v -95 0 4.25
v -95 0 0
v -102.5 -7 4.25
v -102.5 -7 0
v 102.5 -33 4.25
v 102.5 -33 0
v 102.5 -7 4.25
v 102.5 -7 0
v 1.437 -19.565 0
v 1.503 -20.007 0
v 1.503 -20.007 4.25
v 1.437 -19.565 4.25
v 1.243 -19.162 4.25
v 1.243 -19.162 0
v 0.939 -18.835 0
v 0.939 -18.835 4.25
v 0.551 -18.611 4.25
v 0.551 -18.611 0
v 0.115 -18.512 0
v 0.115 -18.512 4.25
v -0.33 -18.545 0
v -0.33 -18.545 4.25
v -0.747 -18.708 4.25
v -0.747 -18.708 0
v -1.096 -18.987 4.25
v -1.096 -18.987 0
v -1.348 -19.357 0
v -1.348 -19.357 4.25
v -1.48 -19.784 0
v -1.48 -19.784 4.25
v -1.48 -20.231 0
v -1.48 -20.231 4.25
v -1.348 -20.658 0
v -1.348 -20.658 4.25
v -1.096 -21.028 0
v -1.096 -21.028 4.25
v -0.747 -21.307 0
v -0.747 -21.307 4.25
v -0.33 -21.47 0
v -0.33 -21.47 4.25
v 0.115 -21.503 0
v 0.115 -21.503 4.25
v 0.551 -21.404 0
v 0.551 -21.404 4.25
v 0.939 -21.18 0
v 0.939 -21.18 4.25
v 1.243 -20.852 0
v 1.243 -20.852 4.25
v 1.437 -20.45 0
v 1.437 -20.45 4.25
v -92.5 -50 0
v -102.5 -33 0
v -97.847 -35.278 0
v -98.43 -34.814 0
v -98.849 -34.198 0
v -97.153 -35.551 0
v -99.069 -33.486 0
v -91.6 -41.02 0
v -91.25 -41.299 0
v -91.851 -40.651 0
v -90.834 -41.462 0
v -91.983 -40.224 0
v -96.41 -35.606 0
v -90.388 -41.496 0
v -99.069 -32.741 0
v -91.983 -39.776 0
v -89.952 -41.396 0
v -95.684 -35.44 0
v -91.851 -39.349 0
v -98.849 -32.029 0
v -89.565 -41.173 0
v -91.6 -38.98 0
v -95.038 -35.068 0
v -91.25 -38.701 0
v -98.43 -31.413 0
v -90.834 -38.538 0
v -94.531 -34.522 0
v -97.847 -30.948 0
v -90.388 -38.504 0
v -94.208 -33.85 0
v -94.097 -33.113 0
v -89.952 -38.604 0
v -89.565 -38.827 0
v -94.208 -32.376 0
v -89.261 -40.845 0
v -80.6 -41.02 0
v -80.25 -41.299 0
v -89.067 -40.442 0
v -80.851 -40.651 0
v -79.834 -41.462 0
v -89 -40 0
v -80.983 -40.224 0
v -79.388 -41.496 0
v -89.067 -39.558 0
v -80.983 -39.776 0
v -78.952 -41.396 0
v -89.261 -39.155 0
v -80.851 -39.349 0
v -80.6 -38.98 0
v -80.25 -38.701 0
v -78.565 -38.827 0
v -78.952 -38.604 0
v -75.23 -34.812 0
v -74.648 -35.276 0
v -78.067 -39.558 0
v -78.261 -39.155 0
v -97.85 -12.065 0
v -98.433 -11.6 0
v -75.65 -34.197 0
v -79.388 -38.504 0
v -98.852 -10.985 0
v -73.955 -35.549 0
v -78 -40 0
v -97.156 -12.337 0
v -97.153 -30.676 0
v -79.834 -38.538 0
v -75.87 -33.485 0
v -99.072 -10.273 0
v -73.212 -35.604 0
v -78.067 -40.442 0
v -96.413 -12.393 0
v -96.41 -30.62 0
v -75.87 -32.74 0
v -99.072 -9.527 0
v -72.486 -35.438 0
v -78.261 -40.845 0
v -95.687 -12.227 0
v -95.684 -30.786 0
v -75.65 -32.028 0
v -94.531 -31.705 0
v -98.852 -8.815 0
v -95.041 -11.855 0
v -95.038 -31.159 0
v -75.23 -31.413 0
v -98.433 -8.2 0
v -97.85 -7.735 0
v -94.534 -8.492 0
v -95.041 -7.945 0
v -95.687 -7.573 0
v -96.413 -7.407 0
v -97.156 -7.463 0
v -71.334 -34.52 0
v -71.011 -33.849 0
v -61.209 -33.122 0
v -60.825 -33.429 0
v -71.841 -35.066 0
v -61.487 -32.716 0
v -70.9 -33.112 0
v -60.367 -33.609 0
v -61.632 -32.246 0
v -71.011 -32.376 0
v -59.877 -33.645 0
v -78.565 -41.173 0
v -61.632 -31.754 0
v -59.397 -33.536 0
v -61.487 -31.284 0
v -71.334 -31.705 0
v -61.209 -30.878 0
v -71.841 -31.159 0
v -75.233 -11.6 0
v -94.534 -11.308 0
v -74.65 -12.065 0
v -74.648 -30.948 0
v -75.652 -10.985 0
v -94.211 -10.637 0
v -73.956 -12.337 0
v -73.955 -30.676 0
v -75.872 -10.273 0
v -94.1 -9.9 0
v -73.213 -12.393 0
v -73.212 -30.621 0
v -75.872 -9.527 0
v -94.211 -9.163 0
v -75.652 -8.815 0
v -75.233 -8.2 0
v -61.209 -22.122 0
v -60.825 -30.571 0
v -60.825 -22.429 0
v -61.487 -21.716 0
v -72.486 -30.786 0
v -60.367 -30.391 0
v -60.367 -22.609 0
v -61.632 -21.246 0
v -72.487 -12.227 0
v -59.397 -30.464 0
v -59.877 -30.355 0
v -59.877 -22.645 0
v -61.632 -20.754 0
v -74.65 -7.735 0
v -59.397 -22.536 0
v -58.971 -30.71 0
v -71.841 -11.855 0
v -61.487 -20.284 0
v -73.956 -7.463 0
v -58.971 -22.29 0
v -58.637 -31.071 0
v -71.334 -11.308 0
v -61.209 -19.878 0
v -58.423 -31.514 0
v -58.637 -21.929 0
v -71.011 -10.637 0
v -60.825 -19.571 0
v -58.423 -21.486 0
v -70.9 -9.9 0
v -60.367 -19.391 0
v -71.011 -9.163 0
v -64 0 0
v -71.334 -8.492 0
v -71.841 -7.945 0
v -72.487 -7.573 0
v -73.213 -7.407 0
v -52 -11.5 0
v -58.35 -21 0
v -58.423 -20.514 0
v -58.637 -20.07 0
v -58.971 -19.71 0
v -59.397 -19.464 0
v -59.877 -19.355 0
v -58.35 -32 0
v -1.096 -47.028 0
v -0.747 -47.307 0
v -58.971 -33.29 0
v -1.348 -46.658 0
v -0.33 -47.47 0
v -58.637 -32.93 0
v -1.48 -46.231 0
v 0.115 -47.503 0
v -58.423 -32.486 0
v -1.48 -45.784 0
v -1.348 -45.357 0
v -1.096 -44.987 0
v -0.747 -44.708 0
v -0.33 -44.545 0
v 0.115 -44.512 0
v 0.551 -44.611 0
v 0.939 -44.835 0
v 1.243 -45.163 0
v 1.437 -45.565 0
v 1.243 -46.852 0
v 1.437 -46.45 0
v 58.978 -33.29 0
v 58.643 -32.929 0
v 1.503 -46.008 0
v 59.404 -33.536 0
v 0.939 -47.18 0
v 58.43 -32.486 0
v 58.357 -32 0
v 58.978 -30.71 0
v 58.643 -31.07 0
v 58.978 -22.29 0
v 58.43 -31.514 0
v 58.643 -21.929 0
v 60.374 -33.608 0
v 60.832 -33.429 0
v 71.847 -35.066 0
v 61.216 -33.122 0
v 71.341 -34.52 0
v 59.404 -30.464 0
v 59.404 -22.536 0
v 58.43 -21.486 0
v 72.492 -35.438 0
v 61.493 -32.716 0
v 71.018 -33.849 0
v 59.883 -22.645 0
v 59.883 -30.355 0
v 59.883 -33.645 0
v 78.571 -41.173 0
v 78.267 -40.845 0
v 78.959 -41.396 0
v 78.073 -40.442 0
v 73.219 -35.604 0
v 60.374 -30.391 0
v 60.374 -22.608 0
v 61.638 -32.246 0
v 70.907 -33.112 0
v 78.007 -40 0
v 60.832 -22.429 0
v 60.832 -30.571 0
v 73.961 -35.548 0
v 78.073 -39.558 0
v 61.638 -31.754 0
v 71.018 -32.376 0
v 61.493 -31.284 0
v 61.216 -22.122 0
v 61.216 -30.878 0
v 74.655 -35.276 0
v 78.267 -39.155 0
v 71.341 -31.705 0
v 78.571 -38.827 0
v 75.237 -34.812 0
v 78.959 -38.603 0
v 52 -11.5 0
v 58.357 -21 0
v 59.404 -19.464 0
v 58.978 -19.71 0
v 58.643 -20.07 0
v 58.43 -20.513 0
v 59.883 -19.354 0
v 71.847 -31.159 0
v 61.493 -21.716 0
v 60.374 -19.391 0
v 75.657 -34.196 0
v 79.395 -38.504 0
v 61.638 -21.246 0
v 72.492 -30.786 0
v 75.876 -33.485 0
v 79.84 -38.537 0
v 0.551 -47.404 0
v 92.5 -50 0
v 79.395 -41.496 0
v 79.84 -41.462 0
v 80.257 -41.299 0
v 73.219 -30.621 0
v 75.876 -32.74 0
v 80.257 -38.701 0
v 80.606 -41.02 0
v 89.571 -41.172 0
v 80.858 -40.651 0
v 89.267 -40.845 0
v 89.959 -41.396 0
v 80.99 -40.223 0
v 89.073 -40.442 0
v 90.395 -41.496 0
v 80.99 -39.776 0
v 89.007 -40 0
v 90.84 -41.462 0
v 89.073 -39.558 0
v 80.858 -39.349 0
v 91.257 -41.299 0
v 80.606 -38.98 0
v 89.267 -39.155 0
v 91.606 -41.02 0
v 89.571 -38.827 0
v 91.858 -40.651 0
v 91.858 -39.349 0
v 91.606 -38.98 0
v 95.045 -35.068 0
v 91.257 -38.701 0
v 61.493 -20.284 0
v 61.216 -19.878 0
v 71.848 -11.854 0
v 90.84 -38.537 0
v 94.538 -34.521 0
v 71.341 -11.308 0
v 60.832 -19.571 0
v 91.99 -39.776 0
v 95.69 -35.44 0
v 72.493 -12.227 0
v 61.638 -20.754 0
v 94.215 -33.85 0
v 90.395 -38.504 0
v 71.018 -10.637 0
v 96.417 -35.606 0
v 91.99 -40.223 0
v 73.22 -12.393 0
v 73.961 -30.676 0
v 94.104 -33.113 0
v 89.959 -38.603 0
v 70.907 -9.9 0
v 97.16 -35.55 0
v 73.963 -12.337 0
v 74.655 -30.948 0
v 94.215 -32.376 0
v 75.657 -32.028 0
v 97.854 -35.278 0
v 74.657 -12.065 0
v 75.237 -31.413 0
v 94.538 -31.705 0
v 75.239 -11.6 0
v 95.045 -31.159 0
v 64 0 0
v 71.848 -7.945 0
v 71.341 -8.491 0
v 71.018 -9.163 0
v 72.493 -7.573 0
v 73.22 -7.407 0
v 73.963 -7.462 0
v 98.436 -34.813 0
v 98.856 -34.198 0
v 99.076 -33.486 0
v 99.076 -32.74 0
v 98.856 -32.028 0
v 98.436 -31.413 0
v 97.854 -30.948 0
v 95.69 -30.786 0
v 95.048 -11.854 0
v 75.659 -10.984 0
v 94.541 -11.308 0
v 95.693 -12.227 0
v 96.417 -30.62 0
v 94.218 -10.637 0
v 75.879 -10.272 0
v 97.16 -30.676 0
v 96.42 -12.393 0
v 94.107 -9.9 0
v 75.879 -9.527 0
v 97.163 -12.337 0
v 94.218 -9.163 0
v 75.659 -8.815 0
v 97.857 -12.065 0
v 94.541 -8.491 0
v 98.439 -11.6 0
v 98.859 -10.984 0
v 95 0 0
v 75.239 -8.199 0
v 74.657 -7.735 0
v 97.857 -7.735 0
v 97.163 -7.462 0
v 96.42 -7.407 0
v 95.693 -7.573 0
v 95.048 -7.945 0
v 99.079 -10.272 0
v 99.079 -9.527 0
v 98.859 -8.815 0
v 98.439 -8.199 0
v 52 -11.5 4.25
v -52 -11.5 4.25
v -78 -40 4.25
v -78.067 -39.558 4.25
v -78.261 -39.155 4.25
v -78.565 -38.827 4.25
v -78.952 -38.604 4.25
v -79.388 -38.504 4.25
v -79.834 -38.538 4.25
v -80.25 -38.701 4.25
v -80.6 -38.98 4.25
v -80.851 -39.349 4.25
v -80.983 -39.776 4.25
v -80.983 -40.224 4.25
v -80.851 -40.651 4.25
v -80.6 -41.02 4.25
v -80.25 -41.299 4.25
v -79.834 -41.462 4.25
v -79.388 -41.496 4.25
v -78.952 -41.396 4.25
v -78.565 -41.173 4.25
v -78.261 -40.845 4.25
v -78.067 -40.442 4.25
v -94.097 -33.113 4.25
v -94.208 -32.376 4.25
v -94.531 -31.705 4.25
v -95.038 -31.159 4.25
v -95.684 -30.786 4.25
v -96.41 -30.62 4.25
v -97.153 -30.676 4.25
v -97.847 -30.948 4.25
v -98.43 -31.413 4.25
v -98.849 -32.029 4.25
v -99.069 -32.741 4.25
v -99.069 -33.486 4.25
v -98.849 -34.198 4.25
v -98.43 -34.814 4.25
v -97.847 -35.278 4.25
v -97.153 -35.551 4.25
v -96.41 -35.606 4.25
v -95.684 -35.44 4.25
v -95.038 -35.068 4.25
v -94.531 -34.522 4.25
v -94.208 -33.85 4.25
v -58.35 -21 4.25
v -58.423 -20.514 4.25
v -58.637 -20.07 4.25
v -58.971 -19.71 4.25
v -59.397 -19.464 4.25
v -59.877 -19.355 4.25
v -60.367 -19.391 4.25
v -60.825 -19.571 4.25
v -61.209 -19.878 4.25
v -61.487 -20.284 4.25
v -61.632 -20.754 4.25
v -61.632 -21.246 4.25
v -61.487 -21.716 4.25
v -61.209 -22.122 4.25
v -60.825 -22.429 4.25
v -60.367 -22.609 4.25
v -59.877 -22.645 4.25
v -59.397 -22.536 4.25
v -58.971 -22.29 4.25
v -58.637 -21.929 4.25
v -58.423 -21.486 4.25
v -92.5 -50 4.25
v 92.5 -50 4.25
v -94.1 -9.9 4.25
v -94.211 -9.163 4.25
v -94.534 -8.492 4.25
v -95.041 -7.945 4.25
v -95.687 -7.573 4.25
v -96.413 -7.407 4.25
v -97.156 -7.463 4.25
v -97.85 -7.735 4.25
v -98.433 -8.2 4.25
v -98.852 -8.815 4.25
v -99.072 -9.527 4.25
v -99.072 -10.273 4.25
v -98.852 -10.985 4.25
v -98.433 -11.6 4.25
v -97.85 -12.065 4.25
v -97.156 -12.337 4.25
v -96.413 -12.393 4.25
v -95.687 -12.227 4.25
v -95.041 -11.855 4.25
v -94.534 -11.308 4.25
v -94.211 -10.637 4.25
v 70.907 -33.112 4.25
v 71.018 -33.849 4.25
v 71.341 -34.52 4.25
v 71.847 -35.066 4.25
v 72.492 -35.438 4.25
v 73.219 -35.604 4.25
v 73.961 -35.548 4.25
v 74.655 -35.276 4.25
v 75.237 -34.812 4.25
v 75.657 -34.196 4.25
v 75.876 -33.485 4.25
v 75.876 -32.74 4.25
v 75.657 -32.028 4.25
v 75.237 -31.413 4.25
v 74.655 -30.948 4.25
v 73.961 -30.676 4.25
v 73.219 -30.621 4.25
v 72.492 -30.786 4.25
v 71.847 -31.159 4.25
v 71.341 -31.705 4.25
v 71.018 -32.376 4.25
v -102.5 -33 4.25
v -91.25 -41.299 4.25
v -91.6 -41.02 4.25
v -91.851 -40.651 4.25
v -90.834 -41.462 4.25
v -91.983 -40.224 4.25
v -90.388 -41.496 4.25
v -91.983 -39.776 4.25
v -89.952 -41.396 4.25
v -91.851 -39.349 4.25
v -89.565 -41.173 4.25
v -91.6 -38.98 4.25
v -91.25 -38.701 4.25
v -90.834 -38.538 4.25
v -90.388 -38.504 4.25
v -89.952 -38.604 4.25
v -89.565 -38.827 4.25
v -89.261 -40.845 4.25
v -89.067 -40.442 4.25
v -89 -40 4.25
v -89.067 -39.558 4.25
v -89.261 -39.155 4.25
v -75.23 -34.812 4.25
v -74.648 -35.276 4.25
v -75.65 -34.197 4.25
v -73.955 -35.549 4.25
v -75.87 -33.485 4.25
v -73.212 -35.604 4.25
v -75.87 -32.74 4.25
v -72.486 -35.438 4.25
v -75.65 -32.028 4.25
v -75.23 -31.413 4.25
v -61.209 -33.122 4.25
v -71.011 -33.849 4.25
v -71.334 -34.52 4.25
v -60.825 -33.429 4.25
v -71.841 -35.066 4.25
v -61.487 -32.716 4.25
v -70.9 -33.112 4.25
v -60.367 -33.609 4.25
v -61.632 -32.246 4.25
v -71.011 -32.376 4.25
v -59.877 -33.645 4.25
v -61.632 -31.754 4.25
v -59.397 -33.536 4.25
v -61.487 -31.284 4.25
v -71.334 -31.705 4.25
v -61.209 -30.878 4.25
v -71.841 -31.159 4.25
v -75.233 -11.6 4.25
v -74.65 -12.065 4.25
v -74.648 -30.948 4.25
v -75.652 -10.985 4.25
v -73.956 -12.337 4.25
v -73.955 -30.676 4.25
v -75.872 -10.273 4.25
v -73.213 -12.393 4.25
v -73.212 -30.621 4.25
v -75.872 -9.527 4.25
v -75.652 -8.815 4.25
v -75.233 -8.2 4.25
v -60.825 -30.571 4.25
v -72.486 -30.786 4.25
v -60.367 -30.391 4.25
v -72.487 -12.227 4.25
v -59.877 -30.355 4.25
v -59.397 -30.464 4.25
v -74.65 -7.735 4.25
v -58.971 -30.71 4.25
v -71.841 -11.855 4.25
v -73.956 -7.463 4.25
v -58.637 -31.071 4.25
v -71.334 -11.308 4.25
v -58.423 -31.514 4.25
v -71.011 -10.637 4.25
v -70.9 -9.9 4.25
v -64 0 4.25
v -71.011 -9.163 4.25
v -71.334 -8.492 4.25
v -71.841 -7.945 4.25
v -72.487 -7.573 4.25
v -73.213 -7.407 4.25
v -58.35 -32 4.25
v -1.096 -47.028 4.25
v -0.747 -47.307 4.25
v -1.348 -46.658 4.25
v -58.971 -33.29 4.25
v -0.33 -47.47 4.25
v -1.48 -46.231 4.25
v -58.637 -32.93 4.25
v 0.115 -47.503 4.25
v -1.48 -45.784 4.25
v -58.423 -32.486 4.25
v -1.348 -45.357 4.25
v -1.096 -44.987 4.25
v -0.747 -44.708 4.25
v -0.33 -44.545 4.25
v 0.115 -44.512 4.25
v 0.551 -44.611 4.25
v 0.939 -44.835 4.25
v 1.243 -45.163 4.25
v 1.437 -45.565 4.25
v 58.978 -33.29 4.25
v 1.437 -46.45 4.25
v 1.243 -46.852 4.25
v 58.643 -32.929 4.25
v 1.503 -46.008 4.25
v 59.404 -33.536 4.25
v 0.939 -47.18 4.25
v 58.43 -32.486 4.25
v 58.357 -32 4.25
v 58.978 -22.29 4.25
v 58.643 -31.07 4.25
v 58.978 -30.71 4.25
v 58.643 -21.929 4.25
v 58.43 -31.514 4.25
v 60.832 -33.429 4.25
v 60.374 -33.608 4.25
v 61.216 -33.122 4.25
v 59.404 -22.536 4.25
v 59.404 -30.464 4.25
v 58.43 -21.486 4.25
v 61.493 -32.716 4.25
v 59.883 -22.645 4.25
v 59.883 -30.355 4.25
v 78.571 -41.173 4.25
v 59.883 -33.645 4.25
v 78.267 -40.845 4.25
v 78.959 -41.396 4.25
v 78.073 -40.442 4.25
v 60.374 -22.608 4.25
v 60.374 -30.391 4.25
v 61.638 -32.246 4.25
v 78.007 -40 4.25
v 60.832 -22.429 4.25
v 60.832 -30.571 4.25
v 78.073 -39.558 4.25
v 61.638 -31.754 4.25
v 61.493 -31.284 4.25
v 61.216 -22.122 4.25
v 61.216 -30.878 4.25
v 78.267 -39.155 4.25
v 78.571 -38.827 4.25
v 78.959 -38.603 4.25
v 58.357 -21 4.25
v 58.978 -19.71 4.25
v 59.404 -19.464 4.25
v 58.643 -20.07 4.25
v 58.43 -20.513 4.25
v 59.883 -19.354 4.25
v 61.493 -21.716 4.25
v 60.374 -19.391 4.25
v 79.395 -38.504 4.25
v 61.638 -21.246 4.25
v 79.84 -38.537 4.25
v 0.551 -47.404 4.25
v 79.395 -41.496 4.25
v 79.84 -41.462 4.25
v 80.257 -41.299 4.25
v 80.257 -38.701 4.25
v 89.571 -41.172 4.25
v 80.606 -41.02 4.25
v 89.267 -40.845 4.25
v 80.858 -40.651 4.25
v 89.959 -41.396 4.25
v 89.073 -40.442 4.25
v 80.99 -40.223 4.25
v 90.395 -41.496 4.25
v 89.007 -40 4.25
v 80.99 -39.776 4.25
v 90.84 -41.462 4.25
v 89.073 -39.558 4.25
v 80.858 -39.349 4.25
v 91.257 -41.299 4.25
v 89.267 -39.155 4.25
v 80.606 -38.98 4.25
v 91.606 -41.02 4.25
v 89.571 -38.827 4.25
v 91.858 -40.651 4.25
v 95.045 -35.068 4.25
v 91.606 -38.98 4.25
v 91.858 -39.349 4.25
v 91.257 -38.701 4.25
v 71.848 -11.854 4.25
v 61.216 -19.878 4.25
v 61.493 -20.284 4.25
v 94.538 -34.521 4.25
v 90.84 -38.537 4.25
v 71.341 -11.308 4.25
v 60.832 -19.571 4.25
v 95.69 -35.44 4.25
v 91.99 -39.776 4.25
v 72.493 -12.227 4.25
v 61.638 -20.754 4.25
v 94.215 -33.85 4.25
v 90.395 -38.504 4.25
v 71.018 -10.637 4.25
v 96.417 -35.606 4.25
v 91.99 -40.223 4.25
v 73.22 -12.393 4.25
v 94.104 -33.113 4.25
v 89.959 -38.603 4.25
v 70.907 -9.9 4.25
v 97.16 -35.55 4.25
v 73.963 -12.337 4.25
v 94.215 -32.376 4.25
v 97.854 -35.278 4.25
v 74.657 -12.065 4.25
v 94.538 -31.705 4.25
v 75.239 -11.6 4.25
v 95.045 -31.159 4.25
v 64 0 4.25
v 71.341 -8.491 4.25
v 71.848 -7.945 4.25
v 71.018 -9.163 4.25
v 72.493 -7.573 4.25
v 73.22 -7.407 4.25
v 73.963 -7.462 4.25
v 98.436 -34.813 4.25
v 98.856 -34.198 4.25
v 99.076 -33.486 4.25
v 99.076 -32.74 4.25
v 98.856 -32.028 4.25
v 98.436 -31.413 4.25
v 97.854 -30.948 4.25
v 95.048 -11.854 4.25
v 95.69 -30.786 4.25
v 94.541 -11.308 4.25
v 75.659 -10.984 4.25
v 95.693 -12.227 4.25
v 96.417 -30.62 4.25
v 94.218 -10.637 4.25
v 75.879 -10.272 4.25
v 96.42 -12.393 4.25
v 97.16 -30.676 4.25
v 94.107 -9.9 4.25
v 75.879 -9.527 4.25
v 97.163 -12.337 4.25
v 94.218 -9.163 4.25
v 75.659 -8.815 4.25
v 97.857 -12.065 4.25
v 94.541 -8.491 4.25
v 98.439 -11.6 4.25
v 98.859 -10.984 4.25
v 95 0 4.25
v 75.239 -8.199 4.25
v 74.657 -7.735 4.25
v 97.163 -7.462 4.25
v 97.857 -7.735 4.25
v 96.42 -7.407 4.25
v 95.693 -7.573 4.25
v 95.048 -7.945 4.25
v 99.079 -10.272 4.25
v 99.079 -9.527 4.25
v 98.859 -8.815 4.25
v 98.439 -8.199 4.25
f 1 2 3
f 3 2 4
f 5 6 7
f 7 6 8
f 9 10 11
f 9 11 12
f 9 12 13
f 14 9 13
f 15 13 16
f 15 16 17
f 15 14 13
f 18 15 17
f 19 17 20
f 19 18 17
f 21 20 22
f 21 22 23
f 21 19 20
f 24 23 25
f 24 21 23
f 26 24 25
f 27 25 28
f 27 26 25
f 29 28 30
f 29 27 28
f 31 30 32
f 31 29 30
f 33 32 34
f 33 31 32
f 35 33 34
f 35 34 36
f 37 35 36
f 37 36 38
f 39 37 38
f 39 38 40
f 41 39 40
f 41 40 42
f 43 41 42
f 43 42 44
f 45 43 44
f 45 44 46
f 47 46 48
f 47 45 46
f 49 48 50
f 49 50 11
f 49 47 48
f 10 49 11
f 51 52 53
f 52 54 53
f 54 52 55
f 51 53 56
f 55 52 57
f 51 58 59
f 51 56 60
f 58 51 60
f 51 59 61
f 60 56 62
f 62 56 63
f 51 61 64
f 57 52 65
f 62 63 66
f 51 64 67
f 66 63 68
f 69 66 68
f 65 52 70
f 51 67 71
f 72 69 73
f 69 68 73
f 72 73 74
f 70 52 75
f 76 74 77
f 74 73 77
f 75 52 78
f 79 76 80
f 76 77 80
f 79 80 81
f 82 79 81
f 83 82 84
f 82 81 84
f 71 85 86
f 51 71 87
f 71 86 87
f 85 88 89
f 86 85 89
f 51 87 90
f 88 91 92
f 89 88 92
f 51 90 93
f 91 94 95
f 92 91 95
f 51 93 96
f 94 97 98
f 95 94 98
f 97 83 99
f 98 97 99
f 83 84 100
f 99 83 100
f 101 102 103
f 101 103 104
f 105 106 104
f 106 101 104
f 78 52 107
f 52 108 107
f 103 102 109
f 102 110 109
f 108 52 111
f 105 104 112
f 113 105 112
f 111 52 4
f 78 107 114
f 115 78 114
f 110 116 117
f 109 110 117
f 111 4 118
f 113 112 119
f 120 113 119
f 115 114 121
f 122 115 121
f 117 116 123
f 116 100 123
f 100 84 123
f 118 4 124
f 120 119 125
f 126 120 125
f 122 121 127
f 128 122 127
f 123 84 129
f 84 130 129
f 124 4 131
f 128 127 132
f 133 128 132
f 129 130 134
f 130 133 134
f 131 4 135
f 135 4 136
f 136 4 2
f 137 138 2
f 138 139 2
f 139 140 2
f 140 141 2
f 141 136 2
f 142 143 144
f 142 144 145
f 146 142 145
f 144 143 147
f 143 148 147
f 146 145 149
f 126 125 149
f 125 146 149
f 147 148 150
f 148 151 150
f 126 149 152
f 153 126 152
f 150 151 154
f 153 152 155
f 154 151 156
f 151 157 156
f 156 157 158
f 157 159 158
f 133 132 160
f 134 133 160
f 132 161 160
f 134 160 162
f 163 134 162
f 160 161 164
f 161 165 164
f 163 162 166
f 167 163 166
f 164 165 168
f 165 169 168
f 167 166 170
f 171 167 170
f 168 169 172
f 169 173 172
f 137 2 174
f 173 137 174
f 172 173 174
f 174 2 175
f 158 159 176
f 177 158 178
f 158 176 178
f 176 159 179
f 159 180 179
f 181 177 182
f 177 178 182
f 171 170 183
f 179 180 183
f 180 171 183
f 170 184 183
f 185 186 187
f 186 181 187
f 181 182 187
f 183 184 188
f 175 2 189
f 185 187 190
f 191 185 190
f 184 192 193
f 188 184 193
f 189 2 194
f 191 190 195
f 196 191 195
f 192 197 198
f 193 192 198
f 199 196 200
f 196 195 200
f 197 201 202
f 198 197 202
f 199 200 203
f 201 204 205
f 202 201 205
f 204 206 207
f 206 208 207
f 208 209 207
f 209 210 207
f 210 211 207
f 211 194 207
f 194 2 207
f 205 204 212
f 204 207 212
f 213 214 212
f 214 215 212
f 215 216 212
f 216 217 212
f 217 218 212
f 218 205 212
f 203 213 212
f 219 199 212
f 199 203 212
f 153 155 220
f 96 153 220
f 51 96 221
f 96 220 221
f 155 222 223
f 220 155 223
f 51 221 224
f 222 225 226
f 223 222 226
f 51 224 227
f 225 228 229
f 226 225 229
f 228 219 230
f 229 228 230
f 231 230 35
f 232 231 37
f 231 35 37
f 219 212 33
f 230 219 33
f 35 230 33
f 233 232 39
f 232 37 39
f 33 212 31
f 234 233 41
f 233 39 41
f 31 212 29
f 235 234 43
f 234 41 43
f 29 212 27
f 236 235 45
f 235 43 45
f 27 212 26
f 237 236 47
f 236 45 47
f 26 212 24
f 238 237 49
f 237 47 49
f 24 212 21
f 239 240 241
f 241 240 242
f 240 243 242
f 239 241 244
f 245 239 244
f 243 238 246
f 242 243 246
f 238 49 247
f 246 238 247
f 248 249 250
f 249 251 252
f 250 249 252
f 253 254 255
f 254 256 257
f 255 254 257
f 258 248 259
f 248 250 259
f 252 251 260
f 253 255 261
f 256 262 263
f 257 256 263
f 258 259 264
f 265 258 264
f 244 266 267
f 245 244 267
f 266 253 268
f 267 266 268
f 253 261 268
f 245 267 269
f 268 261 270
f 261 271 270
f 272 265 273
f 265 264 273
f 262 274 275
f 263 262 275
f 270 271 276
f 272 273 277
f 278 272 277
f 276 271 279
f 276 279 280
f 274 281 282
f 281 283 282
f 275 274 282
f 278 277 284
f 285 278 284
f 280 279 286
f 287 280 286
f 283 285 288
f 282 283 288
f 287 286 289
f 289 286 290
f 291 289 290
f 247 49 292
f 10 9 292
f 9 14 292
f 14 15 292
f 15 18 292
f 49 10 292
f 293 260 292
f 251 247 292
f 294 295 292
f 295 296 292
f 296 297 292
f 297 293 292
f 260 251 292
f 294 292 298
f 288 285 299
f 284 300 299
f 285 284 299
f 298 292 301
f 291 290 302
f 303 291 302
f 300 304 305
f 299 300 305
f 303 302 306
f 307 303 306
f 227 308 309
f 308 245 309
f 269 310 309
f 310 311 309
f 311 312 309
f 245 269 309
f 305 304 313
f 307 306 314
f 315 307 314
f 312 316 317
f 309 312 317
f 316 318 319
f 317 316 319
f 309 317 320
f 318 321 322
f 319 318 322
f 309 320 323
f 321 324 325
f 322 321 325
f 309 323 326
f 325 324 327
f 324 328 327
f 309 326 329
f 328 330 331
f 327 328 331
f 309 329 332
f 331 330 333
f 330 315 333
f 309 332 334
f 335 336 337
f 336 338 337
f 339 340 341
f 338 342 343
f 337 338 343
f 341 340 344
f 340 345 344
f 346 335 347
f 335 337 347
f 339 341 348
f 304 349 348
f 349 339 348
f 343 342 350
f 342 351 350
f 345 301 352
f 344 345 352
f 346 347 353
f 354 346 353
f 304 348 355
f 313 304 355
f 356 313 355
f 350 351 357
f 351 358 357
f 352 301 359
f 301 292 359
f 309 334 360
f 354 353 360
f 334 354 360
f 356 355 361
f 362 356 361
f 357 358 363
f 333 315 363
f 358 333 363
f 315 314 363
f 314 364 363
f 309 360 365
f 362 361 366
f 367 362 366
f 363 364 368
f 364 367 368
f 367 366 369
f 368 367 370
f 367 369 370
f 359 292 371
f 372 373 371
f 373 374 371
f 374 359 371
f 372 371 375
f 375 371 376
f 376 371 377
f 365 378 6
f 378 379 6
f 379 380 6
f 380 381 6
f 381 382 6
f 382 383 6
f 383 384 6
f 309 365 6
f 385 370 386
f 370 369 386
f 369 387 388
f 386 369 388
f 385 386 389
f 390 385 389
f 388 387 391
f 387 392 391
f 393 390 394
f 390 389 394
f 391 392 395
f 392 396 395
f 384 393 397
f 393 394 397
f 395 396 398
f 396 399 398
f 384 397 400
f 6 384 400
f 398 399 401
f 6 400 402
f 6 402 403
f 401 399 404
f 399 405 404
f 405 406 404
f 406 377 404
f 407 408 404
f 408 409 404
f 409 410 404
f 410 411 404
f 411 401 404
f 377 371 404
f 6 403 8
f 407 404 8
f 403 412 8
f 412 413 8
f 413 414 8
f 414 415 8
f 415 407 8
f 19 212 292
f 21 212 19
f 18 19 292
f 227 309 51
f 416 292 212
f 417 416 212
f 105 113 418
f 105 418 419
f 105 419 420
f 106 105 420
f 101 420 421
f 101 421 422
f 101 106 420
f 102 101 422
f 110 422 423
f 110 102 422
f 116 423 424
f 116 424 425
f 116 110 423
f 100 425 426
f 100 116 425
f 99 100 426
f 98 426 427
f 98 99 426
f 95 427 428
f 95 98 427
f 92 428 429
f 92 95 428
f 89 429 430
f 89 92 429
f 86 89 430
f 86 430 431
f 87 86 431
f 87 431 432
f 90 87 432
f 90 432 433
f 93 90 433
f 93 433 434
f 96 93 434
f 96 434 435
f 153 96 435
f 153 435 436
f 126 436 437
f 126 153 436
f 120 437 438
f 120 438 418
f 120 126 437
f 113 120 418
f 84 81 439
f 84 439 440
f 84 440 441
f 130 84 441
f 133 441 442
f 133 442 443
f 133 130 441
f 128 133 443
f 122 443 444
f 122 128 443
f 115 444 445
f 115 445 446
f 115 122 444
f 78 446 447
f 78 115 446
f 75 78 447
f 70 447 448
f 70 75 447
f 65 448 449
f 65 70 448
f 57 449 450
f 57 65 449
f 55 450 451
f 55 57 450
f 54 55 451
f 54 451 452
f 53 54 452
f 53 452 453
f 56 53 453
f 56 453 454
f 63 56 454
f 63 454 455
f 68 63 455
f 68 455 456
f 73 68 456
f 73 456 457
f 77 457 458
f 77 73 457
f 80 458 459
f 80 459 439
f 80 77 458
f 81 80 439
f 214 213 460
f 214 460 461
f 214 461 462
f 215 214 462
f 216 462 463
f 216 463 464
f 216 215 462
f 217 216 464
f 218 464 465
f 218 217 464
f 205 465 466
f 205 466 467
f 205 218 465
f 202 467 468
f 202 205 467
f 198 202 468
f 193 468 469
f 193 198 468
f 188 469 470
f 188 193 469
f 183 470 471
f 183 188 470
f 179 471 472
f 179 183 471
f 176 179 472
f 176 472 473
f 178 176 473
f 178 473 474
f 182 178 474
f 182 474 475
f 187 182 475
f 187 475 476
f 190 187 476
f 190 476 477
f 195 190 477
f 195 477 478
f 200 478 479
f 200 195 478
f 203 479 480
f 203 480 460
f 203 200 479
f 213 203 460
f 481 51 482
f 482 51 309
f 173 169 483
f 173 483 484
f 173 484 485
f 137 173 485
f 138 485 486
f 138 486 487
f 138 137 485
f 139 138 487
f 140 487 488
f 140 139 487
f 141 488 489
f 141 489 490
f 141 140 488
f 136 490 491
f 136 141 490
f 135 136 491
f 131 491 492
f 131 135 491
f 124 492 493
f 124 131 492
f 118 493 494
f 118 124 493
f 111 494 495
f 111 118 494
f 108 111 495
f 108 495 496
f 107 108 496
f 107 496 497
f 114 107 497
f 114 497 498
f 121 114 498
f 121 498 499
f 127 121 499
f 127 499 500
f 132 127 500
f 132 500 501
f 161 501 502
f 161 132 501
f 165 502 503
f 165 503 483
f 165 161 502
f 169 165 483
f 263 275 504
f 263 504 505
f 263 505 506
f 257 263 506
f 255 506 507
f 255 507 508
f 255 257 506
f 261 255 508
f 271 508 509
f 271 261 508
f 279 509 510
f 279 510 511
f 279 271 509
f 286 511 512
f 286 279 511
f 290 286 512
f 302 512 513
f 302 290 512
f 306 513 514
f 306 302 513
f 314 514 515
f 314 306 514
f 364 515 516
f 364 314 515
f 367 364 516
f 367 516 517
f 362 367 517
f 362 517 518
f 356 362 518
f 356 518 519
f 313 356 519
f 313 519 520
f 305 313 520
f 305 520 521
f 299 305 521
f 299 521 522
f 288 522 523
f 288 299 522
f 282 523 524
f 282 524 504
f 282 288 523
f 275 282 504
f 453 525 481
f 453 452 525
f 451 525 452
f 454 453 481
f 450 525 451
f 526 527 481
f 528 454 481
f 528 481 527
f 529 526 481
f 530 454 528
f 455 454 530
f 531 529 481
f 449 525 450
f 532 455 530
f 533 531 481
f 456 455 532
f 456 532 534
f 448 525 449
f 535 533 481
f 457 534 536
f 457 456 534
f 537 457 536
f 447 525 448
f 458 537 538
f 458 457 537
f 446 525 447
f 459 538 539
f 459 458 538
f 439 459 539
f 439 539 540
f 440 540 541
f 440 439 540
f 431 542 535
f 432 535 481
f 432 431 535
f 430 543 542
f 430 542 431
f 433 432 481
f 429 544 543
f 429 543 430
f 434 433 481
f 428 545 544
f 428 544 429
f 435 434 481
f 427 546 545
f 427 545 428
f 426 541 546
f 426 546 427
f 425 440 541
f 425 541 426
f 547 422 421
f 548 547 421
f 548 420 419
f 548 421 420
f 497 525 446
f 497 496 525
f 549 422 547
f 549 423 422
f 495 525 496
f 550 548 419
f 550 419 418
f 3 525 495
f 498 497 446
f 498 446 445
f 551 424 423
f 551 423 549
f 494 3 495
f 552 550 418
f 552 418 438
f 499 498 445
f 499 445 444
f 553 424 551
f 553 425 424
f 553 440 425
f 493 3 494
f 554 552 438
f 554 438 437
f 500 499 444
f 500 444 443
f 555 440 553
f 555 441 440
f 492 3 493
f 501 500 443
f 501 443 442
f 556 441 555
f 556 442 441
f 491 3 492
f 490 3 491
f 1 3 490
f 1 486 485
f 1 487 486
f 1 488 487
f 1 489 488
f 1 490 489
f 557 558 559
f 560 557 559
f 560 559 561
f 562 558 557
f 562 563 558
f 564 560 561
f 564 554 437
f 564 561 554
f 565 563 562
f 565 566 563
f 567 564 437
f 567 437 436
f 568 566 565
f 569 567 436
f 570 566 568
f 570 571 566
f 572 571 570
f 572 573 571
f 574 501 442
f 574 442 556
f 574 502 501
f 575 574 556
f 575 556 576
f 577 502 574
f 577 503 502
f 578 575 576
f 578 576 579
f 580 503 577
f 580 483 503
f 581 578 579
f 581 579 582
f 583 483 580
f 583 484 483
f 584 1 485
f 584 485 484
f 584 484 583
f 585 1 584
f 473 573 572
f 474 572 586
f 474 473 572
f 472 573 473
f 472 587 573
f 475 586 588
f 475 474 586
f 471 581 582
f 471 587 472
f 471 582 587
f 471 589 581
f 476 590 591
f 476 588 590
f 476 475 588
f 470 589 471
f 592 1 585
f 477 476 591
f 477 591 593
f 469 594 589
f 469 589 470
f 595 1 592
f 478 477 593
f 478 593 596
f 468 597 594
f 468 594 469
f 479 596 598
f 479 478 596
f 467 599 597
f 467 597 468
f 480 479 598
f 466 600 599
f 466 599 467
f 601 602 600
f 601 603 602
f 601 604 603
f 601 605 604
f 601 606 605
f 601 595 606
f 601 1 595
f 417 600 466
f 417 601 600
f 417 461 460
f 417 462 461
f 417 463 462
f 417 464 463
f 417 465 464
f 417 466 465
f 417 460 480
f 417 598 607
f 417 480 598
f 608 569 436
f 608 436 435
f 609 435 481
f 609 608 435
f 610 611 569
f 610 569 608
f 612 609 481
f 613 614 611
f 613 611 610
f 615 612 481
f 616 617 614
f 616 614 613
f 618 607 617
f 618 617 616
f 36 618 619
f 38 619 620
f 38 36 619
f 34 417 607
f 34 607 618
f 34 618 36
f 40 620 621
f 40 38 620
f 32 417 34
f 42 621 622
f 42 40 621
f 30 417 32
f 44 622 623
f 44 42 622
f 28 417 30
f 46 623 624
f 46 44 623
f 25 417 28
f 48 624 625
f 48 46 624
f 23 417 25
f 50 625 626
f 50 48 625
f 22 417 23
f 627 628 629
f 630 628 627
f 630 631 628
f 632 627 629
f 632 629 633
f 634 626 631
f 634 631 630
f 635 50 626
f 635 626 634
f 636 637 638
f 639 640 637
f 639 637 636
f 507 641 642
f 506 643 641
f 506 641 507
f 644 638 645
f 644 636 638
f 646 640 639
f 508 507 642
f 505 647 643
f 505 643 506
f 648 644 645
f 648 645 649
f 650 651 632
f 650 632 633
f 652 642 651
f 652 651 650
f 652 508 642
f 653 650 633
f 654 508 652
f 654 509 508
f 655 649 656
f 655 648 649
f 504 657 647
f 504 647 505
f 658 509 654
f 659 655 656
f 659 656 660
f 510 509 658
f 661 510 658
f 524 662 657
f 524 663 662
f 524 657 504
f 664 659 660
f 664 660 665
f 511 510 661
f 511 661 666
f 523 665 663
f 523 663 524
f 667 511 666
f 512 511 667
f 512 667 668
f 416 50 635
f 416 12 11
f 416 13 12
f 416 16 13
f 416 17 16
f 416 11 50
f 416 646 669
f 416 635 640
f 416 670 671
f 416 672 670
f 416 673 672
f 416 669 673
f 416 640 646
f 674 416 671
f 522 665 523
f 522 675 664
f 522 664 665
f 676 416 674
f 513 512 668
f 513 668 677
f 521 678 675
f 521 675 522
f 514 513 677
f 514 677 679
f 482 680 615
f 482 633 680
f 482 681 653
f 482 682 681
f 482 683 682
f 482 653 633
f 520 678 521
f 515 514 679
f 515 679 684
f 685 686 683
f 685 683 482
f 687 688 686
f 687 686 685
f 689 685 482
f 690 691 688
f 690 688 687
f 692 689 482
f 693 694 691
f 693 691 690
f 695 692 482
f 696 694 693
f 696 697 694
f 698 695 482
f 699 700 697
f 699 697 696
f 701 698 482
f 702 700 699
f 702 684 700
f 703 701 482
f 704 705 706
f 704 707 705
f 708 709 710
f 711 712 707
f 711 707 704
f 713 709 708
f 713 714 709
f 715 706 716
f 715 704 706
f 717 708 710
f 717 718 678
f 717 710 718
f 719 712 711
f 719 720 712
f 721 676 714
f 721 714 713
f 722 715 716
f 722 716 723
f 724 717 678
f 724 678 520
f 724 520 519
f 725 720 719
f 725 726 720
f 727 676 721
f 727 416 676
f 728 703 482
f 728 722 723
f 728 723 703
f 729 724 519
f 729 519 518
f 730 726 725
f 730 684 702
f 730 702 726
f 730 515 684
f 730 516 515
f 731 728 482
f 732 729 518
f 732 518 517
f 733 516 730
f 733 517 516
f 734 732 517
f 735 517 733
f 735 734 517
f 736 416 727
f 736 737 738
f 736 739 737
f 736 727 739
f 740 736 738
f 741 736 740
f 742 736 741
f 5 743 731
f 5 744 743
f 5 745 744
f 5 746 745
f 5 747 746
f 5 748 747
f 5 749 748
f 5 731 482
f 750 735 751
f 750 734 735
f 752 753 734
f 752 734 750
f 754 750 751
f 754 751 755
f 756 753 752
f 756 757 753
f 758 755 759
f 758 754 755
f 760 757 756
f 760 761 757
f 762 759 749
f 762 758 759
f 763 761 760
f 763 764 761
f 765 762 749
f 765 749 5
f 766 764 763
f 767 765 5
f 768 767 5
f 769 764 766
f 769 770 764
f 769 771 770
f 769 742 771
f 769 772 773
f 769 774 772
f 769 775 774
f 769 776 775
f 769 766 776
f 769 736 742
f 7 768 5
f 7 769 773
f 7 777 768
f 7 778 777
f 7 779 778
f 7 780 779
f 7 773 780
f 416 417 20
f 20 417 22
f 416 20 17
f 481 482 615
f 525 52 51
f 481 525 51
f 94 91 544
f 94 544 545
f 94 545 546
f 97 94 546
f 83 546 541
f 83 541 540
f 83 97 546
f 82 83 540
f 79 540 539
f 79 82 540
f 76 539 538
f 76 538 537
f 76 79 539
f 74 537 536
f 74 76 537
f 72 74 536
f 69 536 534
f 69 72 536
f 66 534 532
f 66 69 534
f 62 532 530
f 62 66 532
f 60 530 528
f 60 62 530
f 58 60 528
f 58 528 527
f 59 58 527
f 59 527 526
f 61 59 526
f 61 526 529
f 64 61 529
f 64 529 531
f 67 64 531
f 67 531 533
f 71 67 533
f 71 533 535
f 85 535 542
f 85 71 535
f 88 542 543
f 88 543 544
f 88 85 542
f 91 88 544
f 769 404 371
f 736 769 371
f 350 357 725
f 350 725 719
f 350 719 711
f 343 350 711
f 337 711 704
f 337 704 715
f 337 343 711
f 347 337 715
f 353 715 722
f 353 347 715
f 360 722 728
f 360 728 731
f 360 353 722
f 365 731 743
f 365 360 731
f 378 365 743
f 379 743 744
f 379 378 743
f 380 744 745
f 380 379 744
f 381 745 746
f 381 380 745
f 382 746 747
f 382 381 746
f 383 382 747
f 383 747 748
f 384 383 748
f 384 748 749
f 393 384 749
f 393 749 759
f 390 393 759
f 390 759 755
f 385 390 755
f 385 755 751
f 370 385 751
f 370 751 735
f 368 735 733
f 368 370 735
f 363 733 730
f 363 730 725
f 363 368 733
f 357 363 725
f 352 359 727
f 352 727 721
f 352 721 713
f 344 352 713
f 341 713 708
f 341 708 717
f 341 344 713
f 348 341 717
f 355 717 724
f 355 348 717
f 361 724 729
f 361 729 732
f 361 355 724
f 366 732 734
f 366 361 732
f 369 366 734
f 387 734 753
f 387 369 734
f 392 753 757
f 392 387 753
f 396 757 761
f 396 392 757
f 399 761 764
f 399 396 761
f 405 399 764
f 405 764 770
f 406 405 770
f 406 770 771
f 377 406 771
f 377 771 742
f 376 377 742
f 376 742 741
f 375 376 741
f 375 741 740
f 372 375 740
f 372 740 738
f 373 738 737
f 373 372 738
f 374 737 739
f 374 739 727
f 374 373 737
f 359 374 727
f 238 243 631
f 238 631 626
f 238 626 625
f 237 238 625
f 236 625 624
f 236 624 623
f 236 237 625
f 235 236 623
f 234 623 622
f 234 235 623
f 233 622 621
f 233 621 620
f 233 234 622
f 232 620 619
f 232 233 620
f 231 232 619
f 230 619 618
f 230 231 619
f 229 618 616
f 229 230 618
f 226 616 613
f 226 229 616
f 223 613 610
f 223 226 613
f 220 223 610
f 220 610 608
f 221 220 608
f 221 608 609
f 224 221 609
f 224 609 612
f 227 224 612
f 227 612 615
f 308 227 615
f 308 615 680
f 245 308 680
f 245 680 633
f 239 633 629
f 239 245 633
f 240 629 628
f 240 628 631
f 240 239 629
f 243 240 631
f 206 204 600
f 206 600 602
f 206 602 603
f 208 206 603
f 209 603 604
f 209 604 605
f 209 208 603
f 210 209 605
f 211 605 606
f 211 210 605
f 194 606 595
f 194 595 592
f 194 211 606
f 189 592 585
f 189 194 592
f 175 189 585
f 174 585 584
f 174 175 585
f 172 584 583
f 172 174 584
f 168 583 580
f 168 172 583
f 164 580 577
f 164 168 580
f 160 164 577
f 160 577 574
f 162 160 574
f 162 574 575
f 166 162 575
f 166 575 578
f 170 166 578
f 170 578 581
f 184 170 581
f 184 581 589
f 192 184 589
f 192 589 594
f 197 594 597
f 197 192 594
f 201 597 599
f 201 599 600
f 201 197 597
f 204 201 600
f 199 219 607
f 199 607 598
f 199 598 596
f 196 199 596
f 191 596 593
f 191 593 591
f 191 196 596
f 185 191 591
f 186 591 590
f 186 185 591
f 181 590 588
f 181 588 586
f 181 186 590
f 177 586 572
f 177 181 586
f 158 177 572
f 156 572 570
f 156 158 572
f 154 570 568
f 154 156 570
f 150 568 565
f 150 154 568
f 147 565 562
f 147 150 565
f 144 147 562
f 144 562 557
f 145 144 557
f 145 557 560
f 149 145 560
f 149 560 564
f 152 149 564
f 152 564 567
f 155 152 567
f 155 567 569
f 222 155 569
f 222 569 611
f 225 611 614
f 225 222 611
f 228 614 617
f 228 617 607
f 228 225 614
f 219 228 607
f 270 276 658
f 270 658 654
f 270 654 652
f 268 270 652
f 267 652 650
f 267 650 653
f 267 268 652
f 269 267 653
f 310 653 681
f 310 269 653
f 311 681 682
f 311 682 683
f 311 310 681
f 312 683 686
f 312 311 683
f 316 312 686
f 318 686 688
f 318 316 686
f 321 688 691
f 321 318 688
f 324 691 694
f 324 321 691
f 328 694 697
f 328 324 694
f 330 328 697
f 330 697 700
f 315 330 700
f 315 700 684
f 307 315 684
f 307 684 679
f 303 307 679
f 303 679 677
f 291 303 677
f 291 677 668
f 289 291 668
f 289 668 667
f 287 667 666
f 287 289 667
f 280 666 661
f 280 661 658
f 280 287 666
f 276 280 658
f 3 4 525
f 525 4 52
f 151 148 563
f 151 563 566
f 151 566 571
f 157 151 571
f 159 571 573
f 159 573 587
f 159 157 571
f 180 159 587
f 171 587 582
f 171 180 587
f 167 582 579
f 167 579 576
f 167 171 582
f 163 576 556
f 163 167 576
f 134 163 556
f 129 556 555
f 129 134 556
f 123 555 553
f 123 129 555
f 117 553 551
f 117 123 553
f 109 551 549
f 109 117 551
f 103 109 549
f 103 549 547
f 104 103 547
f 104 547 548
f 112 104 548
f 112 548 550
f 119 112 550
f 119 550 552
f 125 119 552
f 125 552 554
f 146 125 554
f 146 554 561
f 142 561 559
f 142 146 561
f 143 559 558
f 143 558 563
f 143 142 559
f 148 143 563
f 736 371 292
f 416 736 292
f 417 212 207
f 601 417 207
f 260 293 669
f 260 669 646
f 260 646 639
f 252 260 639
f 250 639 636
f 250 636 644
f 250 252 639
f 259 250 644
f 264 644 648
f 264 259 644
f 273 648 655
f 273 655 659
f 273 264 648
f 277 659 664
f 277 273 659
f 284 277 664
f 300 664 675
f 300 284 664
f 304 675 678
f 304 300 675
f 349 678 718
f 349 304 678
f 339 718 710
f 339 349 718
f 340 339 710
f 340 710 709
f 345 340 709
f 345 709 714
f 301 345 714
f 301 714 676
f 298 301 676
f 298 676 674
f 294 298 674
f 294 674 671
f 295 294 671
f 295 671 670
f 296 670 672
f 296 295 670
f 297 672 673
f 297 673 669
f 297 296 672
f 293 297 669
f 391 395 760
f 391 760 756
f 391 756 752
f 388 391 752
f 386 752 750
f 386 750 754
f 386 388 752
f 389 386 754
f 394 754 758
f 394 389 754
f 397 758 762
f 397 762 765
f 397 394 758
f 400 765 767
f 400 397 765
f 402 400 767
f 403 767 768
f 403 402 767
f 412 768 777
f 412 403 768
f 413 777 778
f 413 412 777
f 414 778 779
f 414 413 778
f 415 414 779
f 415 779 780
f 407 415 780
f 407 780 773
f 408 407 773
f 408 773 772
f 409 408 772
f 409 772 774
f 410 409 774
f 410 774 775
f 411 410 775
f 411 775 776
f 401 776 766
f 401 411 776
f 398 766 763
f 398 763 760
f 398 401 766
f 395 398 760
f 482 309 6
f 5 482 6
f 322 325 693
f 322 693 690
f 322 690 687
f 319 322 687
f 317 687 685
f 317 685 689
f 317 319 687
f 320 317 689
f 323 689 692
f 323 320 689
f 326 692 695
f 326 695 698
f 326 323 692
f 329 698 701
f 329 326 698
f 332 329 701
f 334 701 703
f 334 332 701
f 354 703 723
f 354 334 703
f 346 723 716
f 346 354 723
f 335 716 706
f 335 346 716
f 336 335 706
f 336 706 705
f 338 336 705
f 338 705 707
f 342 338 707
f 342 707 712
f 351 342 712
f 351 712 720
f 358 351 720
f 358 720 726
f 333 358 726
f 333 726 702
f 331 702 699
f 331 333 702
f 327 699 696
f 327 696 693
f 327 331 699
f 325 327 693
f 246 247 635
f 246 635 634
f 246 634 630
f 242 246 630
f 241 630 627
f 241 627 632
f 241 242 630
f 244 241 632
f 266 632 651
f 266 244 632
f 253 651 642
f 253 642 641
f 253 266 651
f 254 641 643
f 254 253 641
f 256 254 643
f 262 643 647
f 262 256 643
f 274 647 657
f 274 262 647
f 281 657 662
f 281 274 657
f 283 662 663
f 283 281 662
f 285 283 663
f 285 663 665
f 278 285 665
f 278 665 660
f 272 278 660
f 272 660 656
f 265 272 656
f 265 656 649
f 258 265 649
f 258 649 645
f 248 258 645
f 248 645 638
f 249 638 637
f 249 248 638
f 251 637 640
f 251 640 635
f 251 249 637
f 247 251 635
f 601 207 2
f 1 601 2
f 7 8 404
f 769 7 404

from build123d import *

# Parameters (mm, degrees)
SKETCH1_R           = 2.500008074
SKETCH1_R_2         = 2.499971378
SKETCH1_R_3         = 1.650003804
SKETCH1_R_4         = 1.64998699
SKETCH1_R_5         = 2.498738291
SKETCH1_R_6         = 2.499947604
SKETCH1_R_7         = 1.499976694
SKETCH1_R_8         = 1.500017827
SKETCH1_R_9         = 1.50001874
SKETCH1_R_10        = 1.499989662
BOSS_EXTRUDE1_DEPTH = 4.25


with BuildPart() as part:
    # Sketch1 → Boss-Extrude1 (new body)
    with BuildSketch(Plane.XY):
        Polygon((102.5, -33), (102.5, -7), (95, 0), (64, 0), (52, -11.5), (-52, -11.5), (-64, 0), (-95, 0), (-102.5, -7), (-102.5, -33), (-92.5, -50), (92.5, -50), align=None)
        with Locations((-96.600008074, -9.899995929)):
            Circle(SKETCH1_R, mode=Mode.SUBTRACT)
        with Locations((-73.4, -9.899975)):
            Circle(SKETCH1_R_2, mode=Mode.SUBTRACT)
        with Locations((-59.99995, -20.999975175)):
            Circle(SKETCH1_R_3, mode=Mode.SUBTRACT)
        with Locations((-59.99995, -32.000038683)):
            Circle(SKETCH1_R_4, mode=Mode.SUBTRACT)
        with Locations((-73.398707193, -33.112466424)):
            Circle(SKETCH1_R_5, mode=Mode.SUBTRACT)
        with Locations((-96.597049433, -33.113350272)):
            Circle(SKETCH1_R_6, mode=Mode.SUBTRACT)
        with Locations((-90.500019389, -40)):
            Circle(SKETCH1_R_7, mode=Mode.SUBTRACT)
        with Locations((-79.5, -40)):
            Circle(SKETCH1_R_8, mode=Mode.SUBTRACT)
        with Locations((0.003309528, -20.00748325)):
            Circle(SKETCH1_R_9, mode=Mode.SUBTRACT)
        with Locations((0.003345163, -46.007511034)):
            Circle(SKETCH1_R_10, mode=Mode.SUBTRACT)
        with Locations(Location((96.606599424, -9.899731124, 0), (0, 0, 180))):
            Circle(SKETCH1_R, mode=Mode.SUBTRACT)
        with Locations(Location((96.603704415, -33.113085476, 0), (0, 0, 180))):
            Circle(SKETCH1_R_6, mode=Mode.SUBTRACT)
        with Locations(Location((90.506693248, -39.999751917, 0), (0, 0, 180))):
            Circle(SKETCH1_R_7, mode=Mode.SUBTRACT)
        with Locations(Location((73.40659135, -9.899773791, 0), (0, 0, 180))):
            Circle(SKETCH1_R_2, mode=Mode.SUBTRACT)
        with Locations(Location((79.506673859, -39.999782069, 0), (0, 0, 180))):
            Circle(SKETCH1_R_8, mode=Mode.SUBTRACT)
        with Locations(Location((73.405362172, -33.112265218, 0), (0, 0, 180))):
            Circle(SKETCH1_R_5, mode=Mode.SUBTRACT)
        with Locations(Location((60.006571777, -20.999810697, 0), (0, 0, 180))):
            Circle(SKETCH1_R_3, mode=Mode.SUBTRACT)
        with Locations(Location((60.00660193, -31.999874205, 0), (0, 0, 180))):
            Circle(SKETCH1_R_4, mode=Mode.SUBTRACT)
    extrude(amount=BOSS_EXTRUDE1_DEPTH)


solid = part.part
